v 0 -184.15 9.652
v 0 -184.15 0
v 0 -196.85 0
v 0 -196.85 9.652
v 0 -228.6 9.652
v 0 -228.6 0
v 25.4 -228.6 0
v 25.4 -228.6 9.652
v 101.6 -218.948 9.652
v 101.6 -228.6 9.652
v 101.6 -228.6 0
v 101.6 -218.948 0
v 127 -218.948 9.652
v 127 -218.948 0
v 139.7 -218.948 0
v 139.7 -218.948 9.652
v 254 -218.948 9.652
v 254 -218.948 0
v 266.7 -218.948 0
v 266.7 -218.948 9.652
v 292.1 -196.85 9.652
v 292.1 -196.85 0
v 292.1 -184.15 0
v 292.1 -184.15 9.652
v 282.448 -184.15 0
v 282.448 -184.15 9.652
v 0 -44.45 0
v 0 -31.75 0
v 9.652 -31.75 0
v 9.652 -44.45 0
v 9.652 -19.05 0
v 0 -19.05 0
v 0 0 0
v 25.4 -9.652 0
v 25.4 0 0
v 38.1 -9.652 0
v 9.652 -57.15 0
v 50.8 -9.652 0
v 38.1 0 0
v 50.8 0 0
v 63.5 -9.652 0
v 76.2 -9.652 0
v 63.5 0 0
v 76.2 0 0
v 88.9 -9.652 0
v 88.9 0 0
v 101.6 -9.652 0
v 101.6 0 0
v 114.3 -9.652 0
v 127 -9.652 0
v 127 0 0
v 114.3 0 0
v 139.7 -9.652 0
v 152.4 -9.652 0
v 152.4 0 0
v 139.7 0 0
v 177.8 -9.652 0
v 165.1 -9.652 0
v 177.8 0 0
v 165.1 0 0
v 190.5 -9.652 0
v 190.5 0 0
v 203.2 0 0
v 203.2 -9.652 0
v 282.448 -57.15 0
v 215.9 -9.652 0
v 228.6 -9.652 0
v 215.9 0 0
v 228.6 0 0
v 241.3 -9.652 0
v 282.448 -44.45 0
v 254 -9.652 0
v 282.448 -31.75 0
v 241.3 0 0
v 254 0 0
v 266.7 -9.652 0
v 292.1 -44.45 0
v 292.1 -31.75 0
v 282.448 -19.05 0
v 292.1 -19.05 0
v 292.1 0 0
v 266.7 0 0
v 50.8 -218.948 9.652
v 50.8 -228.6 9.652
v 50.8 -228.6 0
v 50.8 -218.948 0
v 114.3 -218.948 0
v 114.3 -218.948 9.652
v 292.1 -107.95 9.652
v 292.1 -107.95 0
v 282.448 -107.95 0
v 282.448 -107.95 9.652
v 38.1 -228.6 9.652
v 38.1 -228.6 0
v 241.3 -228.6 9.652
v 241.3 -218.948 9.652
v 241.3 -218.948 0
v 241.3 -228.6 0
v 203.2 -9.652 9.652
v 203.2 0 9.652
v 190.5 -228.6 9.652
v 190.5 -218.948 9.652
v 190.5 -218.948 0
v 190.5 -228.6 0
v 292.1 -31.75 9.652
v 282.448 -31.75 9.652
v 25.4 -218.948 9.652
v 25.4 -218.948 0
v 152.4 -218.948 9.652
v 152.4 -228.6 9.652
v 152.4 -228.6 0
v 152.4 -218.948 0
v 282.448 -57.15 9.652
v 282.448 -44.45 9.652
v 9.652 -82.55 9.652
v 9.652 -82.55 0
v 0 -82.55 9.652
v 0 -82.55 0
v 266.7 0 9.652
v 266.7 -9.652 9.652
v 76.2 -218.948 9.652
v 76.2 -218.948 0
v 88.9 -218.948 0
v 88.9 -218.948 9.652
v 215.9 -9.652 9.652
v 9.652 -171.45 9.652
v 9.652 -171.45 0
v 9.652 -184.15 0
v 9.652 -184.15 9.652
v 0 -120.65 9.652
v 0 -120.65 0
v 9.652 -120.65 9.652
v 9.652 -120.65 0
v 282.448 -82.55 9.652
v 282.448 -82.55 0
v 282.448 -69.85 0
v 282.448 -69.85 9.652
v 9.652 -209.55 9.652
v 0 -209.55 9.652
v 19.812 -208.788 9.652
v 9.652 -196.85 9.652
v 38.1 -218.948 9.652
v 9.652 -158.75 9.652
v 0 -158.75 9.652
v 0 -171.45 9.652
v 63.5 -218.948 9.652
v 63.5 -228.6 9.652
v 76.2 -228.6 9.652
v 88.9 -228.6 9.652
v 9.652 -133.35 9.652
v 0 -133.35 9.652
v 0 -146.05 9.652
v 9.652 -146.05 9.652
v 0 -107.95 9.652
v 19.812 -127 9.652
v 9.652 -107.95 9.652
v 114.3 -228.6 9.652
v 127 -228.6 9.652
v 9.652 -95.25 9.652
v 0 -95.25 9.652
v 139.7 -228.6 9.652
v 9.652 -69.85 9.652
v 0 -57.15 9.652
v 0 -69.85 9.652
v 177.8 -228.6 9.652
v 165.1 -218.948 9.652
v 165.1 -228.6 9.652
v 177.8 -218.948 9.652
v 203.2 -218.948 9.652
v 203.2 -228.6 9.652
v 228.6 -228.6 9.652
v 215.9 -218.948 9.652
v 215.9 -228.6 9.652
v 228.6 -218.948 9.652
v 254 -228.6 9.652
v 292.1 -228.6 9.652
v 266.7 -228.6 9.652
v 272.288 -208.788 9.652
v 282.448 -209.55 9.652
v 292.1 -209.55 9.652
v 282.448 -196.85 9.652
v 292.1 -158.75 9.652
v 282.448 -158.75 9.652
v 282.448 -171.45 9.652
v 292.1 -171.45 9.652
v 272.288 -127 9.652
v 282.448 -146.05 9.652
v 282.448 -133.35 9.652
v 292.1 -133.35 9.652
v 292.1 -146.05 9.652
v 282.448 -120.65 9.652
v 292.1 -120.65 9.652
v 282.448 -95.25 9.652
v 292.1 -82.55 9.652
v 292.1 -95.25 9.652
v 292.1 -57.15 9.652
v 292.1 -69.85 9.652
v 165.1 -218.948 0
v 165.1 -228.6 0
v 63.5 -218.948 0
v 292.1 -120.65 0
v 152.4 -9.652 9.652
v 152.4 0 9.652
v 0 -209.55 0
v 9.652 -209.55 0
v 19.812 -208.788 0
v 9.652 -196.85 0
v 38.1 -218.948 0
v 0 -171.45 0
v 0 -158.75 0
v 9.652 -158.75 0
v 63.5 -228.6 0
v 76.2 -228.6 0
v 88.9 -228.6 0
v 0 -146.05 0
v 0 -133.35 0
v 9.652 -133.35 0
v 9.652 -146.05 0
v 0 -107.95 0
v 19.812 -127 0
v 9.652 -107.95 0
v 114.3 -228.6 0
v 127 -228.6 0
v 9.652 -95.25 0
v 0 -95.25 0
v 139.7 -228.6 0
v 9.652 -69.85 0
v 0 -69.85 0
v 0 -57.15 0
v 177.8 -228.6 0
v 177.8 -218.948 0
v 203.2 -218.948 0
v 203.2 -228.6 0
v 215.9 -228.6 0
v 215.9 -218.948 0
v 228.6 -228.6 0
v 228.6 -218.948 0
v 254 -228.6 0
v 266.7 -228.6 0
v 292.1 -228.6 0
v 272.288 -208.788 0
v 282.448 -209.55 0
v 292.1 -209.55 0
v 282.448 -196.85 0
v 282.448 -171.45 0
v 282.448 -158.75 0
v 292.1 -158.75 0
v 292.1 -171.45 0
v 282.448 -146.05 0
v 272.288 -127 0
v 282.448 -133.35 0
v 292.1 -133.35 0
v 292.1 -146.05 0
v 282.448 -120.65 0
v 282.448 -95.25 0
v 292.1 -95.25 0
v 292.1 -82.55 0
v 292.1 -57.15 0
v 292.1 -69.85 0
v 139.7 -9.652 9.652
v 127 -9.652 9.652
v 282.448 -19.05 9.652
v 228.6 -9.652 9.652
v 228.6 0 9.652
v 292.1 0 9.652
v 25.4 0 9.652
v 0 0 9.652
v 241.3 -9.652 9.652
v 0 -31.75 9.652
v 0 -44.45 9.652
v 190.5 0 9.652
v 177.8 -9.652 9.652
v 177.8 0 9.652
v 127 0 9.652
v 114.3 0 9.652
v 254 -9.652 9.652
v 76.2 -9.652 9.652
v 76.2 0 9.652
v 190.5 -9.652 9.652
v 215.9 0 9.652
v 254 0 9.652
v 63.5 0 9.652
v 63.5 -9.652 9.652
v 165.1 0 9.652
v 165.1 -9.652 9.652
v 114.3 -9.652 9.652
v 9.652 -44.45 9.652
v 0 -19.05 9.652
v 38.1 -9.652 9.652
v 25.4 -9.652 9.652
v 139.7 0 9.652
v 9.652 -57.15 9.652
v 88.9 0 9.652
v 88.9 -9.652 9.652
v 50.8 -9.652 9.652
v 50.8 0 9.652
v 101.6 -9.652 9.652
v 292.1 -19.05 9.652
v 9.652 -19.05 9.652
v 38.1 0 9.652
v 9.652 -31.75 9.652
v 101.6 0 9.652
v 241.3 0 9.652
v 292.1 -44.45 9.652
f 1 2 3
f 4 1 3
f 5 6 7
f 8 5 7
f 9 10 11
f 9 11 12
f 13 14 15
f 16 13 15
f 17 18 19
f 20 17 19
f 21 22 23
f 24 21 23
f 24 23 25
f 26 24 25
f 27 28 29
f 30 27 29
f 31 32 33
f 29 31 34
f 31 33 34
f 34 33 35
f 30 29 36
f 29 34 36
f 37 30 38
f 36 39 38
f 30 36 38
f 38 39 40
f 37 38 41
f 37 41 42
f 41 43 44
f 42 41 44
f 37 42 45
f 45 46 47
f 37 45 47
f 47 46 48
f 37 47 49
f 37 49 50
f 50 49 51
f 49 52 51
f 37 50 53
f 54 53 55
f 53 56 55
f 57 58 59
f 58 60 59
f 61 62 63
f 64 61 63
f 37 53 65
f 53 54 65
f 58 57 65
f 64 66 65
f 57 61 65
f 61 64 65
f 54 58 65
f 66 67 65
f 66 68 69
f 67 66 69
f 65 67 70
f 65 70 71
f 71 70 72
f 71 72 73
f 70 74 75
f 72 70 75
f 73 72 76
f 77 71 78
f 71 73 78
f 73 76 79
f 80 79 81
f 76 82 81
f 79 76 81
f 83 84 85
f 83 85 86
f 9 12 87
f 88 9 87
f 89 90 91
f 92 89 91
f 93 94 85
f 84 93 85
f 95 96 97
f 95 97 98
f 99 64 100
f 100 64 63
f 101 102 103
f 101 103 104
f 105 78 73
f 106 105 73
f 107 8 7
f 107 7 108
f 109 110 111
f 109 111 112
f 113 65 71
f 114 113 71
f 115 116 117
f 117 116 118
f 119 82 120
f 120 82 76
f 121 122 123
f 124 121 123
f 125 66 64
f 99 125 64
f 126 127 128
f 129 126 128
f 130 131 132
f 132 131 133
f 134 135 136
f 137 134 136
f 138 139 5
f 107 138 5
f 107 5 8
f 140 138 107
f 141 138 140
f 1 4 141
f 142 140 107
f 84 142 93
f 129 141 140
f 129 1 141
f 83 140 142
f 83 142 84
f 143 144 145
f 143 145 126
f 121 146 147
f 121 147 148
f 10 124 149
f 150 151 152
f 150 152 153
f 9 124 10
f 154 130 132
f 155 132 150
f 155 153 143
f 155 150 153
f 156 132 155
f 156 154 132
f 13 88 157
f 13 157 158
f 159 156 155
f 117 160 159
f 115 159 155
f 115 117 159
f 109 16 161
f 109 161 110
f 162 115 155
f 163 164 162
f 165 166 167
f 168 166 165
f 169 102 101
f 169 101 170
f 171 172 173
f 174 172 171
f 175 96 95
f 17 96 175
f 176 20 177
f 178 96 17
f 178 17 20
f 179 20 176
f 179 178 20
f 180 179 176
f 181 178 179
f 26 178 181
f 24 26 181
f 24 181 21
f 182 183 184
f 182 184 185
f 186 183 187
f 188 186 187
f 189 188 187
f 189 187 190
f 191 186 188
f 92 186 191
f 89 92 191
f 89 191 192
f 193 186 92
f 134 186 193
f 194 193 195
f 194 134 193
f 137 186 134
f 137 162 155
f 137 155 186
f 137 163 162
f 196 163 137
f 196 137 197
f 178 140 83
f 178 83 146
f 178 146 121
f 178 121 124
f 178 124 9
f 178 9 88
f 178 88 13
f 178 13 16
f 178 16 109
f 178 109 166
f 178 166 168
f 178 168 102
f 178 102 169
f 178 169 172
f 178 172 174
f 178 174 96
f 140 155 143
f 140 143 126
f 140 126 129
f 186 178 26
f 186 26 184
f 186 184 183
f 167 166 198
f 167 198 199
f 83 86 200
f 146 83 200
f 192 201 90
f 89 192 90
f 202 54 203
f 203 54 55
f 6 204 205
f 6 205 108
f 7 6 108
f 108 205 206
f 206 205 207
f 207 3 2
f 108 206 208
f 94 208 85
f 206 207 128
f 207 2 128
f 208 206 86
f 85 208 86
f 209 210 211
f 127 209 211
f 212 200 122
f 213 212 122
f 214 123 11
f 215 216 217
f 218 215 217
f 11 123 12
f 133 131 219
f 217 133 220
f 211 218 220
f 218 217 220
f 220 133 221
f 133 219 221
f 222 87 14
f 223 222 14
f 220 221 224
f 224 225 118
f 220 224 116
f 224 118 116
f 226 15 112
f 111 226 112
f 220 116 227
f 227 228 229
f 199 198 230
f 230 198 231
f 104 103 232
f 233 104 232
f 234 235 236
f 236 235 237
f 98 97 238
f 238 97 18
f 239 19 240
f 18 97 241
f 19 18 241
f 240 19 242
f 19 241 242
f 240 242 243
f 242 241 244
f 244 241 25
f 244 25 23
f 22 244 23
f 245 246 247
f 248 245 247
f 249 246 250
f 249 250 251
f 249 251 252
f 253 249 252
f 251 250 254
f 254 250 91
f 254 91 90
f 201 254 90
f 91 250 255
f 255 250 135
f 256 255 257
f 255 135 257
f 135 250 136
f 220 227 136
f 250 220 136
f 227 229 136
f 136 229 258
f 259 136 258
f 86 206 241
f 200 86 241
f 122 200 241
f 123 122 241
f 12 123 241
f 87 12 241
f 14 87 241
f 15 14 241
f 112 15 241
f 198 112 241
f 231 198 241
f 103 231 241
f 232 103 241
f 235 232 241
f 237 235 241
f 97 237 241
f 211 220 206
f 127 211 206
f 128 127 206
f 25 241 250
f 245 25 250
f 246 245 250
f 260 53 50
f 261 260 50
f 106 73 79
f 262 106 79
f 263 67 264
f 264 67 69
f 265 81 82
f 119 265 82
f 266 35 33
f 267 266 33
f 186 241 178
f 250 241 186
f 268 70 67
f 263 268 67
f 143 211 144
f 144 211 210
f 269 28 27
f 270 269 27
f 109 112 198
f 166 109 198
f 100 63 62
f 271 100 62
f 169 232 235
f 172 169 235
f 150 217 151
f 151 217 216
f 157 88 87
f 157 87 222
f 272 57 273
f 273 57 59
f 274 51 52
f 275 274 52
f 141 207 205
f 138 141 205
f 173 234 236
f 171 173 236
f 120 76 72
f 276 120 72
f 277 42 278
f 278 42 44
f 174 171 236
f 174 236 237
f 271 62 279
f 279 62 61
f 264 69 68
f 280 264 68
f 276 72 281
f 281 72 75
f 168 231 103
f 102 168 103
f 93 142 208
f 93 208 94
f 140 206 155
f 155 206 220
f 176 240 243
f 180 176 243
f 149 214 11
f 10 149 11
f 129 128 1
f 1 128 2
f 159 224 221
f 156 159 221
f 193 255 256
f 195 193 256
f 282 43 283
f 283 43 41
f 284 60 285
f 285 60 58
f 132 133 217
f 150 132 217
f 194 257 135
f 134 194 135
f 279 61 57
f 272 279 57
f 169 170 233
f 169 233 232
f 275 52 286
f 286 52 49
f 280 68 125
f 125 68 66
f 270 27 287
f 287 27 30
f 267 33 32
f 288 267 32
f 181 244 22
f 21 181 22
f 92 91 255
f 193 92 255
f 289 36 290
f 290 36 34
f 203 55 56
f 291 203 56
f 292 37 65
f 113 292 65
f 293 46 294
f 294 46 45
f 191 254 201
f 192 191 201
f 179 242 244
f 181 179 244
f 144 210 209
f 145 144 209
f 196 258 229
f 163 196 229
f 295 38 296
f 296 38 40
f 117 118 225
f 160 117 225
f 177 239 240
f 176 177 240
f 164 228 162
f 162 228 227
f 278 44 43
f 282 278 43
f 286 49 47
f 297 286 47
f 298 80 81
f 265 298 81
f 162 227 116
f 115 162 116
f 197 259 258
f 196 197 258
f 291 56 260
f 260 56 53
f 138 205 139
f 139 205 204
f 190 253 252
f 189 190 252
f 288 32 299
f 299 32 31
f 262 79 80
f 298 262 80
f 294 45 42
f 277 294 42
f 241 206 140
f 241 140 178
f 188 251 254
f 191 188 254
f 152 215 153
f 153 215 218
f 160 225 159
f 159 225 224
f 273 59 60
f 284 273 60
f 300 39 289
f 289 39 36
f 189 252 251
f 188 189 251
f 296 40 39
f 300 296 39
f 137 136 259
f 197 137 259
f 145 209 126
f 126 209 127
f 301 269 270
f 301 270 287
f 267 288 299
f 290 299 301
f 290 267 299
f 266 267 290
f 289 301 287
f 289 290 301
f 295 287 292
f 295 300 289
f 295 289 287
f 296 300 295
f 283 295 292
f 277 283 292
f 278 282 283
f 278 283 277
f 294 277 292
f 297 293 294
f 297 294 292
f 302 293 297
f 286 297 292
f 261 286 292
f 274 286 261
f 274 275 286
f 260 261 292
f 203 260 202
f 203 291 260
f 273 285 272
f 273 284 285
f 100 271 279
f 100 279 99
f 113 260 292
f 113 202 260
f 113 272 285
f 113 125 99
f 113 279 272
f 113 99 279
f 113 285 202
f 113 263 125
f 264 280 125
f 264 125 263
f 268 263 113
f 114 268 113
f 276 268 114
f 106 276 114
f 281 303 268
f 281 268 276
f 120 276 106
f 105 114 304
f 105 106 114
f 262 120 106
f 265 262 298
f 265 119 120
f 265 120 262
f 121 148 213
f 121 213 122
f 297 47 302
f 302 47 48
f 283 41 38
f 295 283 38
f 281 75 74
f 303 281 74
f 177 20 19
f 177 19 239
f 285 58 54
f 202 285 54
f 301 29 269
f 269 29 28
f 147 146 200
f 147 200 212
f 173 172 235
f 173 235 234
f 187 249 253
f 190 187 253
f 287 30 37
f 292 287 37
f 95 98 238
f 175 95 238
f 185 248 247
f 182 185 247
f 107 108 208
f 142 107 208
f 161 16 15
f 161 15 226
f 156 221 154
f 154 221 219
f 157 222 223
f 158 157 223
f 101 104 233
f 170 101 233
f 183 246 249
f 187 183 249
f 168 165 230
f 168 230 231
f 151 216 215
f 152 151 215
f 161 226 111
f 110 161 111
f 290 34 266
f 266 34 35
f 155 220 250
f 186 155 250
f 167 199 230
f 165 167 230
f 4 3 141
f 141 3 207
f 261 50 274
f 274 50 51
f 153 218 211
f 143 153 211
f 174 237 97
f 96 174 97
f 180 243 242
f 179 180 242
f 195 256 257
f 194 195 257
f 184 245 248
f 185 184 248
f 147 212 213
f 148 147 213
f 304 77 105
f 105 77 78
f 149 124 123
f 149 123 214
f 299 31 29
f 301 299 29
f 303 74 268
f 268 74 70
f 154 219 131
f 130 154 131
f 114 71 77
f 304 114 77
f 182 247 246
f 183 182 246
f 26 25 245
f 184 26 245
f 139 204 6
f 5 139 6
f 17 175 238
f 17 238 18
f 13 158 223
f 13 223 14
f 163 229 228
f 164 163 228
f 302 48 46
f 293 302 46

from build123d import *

# Parameters (mm, degrees)
F0_W     = 252.476
F0_H     = 81.788
F1_DEPTH = 9.652
F2_DEPTH = 9.652


with BuildPart() as f1:
    # F0 (on Top) → F1 (new body)
    with BuildSketch(Plane.XY):
        Polygon((282.448, -57.15), (9.652, -57.15), (0, -57.15), (0, -69.85), (9.652, -69.85), (9.652, -82.55), (0, -82.55), (0, -95.25), (9.652, -95.25), (9.652, -107.95), (0, -107.95), (0, -120.65), (9.652, -120.65), (9.652, -133.35), (0, -133.35), (0, -146.05), (9.652, -146.05), (9.652, -158.75), (0, -158.75), (0, -171.45), (9.652, -171.45), (9.652, -184.15), (0, -184.15), (0, -196.85), (9.652, -196.85), (9.652, -209.55), (0, -209.55), (0, -228.6), (25.4, -228.6), (25.4, -218.948), (38.1, -218.948), (38.1, -228.6), (50.8, -228.6), (50.8, -218.948), (63.5, -218.948), (63.5, -228.6), (76.2, -228.6), (76.2, -218.948), (88.9, -218.948), (88.9, -228.6), (101.6, -228.6), (101.6, -218.948), (114.3, -218.948), (114.3, -228.6), (127, -228.6), (127, -218.948), (139.7, -218.948), (139.7, -228.6), (152.4, -228.6), (152.4, -218.948), (165.1, -218.948), (165.1, -228.6), (177.8, -228.6), (177.8, -218.948), (190.5, -218.948), (190.5, -228.6), (203.2, -228.6), (203.2, -218.948), (215.9, -218.948), (215.9, -228.6), (228.6, -228.6), (228.6, -218.948), (241.3, -218.948), (241.3, -228.6), (254, -228.6), (254, -218.948), (266.7, -218.948), (266.7, -228.6), (292.1, -228.6), (292.1, -209.55), (282.448, -209.55), (282.448, -196.85), (292.1, -196.85), (292.1, -184.15), (282.448, -184.15), (282.448, -171.45), (292.1, -171.45), (292.1, -158.75), (282.448, -158.75), (282.448, -146.05), (292.1, -146.05), (292.1, -133.35), (282.448, -133.35), (282.448, -120.65), (292.1, -120.65), (292.1, -107.95), (282.448, -107.95), (282.448, -95.25), (292.1, -95.25), (292.1, -82.55), (282.448, -82.55), (282.448, -69.85), (292.1, -69.85), (292.1, -57.15), align=None)
        with Locations((146.05, -167.894)):
            Rectangle(F0_W, F0_H, mode=Mode.SUBTRACT)
    extrude(amount=F1_DEPTH)


with BuildPart() as f2:
    # F0 (on Top) → F2 (new body)
    with BuildSketch(Plane.XY):
        Polygon((25.4, 0), (0, 0), (0, -19.05), (9.652, -19.05), (9.652, -31.75), (0, -31.75), (0, -44.45), (9.652, -44.45), (9.652, -57.15), (282.448, -57.15), (282.448, -44.45), (292.1, -44.45), (292.1, -31.75), (282.448, -31.75), (282.448, -19.05), (292.1, -19.05), (292.1, 0), (266.7, 0), (266.7, -9.652), (254, -9.652), (254, 0), (241.3, 0), (241.3, -9.652), (228.6, -9.652), (228.6, 0), (215.9, 0), (215.9, -9.652), (203.2, -9.652), (203.2, 0), (190.5, 0), (190.5, -9.652), (177.8, -9.652), (177.8, 0), (165.1, 0), (165.1, -9.652), (152.4, -9.652), (152.4, 0), (139.7, 0), (139.7, -9.652), (127, -9.652), (127, 0), (114.3, 0), (114.3, -9.652), (101.6, -9.652), (101.6, 0), (88.9, 0), (88.9, -9.652), (76.2, -9.652), (76.2, 0), (63.5, 0), (63.5, -9.652), (50.8, -9.652), (50.8, 0), (38.1, 0), (38.1, -9.652), (25.4, -9.652), align=None)
    extrude(amount=F2_DEPTH)


solid = Compound([f1.part, f2.part])
